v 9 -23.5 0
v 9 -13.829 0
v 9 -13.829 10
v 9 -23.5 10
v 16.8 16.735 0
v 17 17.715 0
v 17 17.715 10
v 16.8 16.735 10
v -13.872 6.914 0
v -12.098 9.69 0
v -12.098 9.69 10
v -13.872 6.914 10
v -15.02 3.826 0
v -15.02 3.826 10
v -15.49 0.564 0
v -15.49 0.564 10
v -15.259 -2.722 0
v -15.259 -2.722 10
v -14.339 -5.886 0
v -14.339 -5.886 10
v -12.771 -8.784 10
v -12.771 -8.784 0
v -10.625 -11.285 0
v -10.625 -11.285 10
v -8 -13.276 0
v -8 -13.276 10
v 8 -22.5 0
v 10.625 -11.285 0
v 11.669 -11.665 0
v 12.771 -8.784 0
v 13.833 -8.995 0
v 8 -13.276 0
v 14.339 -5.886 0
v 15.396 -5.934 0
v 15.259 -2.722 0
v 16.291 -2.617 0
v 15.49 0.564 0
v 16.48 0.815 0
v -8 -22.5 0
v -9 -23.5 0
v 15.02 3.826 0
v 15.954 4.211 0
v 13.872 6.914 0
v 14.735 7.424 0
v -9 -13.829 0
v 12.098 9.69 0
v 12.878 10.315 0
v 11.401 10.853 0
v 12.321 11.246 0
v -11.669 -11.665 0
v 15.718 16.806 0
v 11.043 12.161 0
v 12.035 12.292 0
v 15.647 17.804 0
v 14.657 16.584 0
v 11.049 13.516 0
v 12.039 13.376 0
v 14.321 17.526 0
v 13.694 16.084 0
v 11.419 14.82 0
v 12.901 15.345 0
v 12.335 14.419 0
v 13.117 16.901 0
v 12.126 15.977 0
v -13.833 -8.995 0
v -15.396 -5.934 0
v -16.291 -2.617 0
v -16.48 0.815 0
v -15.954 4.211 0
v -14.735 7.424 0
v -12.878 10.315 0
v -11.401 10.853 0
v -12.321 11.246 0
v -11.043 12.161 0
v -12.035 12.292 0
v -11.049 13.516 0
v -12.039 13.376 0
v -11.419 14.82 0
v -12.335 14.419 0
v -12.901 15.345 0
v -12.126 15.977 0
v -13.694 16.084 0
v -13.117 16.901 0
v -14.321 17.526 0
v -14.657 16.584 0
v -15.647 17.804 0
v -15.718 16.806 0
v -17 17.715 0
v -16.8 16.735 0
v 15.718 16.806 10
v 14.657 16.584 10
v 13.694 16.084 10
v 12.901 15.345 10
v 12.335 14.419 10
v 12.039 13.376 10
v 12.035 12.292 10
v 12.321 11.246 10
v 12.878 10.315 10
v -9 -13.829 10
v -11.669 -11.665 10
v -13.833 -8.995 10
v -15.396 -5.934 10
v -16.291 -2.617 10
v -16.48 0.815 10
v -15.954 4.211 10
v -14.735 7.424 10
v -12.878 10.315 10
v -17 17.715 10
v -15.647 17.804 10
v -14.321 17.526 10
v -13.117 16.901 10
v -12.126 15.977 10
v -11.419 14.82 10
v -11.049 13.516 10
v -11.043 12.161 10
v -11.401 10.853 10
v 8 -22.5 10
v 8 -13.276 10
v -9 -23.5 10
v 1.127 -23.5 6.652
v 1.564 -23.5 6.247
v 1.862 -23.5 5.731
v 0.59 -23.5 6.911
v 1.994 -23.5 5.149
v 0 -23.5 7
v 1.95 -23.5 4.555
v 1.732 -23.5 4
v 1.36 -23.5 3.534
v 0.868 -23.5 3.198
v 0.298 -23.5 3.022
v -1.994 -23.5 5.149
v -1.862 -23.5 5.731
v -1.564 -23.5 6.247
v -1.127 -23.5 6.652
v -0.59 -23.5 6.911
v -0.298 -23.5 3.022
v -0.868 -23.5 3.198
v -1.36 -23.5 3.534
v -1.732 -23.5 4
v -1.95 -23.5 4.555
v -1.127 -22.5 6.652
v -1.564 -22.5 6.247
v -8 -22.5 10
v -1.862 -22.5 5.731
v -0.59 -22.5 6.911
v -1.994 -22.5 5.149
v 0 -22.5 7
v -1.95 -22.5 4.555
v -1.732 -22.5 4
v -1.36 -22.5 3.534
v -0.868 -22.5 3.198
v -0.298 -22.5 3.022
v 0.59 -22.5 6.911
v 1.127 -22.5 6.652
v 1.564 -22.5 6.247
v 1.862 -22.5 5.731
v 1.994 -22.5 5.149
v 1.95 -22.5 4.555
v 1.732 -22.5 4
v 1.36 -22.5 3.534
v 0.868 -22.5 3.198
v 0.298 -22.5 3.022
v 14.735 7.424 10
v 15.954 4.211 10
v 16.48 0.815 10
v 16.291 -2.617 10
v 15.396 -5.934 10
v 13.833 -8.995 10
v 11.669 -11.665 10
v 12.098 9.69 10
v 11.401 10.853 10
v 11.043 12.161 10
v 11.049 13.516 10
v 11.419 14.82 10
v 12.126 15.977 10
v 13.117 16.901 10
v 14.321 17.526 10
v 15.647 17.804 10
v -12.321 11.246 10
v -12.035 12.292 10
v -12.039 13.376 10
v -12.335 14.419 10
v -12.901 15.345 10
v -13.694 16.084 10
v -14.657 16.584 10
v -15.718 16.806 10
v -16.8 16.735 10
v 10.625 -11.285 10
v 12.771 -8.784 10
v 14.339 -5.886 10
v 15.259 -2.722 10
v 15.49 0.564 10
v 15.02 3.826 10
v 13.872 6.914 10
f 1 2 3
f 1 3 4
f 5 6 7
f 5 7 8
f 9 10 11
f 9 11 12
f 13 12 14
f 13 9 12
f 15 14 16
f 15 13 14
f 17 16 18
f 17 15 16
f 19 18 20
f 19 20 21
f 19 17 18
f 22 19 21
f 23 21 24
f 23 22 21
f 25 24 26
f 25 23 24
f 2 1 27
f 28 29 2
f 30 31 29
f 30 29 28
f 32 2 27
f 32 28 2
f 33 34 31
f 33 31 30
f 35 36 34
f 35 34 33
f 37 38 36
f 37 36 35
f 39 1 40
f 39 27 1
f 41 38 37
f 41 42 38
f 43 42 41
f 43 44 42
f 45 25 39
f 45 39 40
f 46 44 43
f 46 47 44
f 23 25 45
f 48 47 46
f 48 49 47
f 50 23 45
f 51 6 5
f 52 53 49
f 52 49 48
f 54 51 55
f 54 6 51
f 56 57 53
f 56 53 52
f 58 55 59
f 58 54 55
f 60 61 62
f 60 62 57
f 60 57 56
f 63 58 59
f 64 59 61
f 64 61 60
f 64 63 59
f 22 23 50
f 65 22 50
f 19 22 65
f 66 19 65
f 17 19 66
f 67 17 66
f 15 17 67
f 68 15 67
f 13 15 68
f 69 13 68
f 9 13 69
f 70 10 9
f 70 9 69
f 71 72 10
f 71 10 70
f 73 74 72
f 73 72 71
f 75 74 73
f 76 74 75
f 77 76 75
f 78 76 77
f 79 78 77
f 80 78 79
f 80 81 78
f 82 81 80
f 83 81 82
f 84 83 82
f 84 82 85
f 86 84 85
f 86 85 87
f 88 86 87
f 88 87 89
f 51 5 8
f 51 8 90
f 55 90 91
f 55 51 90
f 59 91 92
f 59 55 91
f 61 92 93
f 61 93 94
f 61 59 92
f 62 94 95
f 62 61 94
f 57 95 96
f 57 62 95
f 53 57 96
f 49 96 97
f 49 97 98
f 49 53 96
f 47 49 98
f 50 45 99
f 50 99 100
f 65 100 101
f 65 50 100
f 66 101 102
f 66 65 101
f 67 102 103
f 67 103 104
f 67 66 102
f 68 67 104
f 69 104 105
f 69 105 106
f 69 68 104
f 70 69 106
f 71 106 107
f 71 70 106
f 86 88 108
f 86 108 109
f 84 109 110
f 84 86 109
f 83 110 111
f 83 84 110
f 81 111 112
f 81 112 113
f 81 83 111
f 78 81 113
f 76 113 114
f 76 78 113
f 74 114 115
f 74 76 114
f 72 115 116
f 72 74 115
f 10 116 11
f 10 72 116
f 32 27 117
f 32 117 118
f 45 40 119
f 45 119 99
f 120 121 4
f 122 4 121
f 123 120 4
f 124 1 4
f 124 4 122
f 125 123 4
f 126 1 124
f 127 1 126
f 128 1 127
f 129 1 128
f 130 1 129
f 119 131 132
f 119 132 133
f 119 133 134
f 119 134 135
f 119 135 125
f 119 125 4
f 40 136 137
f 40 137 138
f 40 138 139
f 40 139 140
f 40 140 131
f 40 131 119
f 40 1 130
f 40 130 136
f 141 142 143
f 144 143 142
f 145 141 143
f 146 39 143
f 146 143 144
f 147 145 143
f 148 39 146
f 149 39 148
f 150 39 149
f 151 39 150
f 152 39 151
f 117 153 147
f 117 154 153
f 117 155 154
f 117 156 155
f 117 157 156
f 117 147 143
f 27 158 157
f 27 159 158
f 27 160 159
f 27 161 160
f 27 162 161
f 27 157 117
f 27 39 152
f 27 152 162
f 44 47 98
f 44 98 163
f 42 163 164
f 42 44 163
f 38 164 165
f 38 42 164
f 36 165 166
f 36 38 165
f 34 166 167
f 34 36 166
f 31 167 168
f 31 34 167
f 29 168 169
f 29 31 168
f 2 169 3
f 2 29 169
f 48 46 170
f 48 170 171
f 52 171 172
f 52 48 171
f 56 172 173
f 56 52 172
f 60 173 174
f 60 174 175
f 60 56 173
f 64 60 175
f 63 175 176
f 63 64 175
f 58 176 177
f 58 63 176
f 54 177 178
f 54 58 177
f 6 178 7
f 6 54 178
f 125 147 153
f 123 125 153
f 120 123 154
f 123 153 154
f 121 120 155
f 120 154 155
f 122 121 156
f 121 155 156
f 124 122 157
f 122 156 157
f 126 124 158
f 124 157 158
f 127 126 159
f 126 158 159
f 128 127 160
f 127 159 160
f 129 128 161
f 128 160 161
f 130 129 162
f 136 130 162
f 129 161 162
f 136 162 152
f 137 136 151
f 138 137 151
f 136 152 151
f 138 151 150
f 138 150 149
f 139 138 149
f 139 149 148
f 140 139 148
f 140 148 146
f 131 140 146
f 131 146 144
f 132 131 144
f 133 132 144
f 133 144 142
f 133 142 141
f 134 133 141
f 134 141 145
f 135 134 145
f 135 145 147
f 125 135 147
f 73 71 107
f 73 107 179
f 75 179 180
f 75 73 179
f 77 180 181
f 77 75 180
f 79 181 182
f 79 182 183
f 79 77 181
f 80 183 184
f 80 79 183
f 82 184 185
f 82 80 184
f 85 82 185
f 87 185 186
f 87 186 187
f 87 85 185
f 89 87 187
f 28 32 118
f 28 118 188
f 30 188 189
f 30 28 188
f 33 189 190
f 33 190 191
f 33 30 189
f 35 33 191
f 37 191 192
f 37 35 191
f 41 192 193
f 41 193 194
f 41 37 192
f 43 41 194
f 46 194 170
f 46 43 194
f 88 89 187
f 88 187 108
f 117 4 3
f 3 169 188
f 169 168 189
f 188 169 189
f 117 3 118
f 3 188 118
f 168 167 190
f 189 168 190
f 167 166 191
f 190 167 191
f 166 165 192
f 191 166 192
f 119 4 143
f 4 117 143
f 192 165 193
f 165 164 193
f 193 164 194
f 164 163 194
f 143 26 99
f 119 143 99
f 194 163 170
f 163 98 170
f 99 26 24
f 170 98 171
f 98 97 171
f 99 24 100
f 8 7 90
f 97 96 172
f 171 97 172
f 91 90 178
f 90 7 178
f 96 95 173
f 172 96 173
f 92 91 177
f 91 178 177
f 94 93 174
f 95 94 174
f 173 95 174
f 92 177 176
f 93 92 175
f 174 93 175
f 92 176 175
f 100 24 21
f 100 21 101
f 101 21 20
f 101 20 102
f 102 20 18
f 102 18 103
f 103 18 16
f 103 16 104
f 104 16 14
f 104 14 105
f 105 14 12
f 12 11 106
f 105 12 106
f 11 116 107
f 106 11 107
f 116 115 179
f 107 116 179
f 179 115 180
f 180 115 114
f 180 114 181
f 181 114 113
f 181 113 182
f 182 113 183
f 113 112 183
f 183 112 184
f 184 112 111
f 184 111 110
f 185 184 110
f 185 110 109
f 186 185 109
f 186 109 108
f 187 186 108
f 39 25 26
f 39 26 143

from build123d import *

# Parameters (mm, degrees)
BOSS_EXTRUDE1_DEPTH = 10
SKETCH2_R           = 2
CUT_EXTRUDE1_DEPTH  = 10


with BuildPart() as part:
    # Sketch1 → Boss-Extrude1 (new body)
    with BuildSketch(Plane.XY):
        with BuildLine():
            Line((8, -22.5), (8, -13.275918047))
            ThreePointArc((8, -13.275918047), (15.259032291, -2.722486649), (12.097560976, 9.690150589))
            ThreePointArc((12.097560976, 9.690150589), (11.733206084, 15.422625974), (17, 17.714985104))
            Line((17, 17.714985104), (16.8, 16.735189206))
            ThreePointArc((16.8, 16.735189206), (12.586564868, 14.901301903), (12.87804878, 10.315321595))
            ThreePointArc((12.87804878, 10.315321595), (16.291198361, -2.616649759), (9, -13.829316686))
            Line((9, -13.829316686), (9, -23.5))
            Line((9, -23.5), (-9, -23.5))
            Line((-9, -23.5), (-9, -13.829316686))
            ThreePointArc((-9, -13.829316686), (-16.291198361, -2.616649759), (-12.87804878, 10.315321595))
            ThreePointArc((-12.87804878, 10.315321595), (-12.586564868, 14.901301903), (-16.8, 16.735189206))
            Line((-16.8, 16.735189206), (-17, 17.714985104))
            ThreePointArc((-17, 17.714985104), (-11.733206084, 15.422625974), (-12.097560976, 9.690150589))
            ThreePointArc((-12.097560976, 9.690150589), (-15.259032291, -2.722486649), (-8, -13.275918047))
            Line((-8, -13.275918047), (-8, -22.5))
            Line((-8, -22.5), (8, -22.5))
        make_face()
    extrude(amount=BOSS_EXTRUDE1_DEPTH)

    # Sketch2 → Cut-Extrude1 (cut)
    with BuildSketch(Plane(origin=(0, -22.5, 0), x_dir=(1, 0, 0), z_dir=(0, 1, 0))):
        with Locations(Location((0, -5, 0), (0, 0, 270))):
            Circle(SKETCH2_R)
    extrude(amount=-CUT_EXTRUDE1_DEPTH, mode=Mode.SUBTRACT)


solid = part.part
